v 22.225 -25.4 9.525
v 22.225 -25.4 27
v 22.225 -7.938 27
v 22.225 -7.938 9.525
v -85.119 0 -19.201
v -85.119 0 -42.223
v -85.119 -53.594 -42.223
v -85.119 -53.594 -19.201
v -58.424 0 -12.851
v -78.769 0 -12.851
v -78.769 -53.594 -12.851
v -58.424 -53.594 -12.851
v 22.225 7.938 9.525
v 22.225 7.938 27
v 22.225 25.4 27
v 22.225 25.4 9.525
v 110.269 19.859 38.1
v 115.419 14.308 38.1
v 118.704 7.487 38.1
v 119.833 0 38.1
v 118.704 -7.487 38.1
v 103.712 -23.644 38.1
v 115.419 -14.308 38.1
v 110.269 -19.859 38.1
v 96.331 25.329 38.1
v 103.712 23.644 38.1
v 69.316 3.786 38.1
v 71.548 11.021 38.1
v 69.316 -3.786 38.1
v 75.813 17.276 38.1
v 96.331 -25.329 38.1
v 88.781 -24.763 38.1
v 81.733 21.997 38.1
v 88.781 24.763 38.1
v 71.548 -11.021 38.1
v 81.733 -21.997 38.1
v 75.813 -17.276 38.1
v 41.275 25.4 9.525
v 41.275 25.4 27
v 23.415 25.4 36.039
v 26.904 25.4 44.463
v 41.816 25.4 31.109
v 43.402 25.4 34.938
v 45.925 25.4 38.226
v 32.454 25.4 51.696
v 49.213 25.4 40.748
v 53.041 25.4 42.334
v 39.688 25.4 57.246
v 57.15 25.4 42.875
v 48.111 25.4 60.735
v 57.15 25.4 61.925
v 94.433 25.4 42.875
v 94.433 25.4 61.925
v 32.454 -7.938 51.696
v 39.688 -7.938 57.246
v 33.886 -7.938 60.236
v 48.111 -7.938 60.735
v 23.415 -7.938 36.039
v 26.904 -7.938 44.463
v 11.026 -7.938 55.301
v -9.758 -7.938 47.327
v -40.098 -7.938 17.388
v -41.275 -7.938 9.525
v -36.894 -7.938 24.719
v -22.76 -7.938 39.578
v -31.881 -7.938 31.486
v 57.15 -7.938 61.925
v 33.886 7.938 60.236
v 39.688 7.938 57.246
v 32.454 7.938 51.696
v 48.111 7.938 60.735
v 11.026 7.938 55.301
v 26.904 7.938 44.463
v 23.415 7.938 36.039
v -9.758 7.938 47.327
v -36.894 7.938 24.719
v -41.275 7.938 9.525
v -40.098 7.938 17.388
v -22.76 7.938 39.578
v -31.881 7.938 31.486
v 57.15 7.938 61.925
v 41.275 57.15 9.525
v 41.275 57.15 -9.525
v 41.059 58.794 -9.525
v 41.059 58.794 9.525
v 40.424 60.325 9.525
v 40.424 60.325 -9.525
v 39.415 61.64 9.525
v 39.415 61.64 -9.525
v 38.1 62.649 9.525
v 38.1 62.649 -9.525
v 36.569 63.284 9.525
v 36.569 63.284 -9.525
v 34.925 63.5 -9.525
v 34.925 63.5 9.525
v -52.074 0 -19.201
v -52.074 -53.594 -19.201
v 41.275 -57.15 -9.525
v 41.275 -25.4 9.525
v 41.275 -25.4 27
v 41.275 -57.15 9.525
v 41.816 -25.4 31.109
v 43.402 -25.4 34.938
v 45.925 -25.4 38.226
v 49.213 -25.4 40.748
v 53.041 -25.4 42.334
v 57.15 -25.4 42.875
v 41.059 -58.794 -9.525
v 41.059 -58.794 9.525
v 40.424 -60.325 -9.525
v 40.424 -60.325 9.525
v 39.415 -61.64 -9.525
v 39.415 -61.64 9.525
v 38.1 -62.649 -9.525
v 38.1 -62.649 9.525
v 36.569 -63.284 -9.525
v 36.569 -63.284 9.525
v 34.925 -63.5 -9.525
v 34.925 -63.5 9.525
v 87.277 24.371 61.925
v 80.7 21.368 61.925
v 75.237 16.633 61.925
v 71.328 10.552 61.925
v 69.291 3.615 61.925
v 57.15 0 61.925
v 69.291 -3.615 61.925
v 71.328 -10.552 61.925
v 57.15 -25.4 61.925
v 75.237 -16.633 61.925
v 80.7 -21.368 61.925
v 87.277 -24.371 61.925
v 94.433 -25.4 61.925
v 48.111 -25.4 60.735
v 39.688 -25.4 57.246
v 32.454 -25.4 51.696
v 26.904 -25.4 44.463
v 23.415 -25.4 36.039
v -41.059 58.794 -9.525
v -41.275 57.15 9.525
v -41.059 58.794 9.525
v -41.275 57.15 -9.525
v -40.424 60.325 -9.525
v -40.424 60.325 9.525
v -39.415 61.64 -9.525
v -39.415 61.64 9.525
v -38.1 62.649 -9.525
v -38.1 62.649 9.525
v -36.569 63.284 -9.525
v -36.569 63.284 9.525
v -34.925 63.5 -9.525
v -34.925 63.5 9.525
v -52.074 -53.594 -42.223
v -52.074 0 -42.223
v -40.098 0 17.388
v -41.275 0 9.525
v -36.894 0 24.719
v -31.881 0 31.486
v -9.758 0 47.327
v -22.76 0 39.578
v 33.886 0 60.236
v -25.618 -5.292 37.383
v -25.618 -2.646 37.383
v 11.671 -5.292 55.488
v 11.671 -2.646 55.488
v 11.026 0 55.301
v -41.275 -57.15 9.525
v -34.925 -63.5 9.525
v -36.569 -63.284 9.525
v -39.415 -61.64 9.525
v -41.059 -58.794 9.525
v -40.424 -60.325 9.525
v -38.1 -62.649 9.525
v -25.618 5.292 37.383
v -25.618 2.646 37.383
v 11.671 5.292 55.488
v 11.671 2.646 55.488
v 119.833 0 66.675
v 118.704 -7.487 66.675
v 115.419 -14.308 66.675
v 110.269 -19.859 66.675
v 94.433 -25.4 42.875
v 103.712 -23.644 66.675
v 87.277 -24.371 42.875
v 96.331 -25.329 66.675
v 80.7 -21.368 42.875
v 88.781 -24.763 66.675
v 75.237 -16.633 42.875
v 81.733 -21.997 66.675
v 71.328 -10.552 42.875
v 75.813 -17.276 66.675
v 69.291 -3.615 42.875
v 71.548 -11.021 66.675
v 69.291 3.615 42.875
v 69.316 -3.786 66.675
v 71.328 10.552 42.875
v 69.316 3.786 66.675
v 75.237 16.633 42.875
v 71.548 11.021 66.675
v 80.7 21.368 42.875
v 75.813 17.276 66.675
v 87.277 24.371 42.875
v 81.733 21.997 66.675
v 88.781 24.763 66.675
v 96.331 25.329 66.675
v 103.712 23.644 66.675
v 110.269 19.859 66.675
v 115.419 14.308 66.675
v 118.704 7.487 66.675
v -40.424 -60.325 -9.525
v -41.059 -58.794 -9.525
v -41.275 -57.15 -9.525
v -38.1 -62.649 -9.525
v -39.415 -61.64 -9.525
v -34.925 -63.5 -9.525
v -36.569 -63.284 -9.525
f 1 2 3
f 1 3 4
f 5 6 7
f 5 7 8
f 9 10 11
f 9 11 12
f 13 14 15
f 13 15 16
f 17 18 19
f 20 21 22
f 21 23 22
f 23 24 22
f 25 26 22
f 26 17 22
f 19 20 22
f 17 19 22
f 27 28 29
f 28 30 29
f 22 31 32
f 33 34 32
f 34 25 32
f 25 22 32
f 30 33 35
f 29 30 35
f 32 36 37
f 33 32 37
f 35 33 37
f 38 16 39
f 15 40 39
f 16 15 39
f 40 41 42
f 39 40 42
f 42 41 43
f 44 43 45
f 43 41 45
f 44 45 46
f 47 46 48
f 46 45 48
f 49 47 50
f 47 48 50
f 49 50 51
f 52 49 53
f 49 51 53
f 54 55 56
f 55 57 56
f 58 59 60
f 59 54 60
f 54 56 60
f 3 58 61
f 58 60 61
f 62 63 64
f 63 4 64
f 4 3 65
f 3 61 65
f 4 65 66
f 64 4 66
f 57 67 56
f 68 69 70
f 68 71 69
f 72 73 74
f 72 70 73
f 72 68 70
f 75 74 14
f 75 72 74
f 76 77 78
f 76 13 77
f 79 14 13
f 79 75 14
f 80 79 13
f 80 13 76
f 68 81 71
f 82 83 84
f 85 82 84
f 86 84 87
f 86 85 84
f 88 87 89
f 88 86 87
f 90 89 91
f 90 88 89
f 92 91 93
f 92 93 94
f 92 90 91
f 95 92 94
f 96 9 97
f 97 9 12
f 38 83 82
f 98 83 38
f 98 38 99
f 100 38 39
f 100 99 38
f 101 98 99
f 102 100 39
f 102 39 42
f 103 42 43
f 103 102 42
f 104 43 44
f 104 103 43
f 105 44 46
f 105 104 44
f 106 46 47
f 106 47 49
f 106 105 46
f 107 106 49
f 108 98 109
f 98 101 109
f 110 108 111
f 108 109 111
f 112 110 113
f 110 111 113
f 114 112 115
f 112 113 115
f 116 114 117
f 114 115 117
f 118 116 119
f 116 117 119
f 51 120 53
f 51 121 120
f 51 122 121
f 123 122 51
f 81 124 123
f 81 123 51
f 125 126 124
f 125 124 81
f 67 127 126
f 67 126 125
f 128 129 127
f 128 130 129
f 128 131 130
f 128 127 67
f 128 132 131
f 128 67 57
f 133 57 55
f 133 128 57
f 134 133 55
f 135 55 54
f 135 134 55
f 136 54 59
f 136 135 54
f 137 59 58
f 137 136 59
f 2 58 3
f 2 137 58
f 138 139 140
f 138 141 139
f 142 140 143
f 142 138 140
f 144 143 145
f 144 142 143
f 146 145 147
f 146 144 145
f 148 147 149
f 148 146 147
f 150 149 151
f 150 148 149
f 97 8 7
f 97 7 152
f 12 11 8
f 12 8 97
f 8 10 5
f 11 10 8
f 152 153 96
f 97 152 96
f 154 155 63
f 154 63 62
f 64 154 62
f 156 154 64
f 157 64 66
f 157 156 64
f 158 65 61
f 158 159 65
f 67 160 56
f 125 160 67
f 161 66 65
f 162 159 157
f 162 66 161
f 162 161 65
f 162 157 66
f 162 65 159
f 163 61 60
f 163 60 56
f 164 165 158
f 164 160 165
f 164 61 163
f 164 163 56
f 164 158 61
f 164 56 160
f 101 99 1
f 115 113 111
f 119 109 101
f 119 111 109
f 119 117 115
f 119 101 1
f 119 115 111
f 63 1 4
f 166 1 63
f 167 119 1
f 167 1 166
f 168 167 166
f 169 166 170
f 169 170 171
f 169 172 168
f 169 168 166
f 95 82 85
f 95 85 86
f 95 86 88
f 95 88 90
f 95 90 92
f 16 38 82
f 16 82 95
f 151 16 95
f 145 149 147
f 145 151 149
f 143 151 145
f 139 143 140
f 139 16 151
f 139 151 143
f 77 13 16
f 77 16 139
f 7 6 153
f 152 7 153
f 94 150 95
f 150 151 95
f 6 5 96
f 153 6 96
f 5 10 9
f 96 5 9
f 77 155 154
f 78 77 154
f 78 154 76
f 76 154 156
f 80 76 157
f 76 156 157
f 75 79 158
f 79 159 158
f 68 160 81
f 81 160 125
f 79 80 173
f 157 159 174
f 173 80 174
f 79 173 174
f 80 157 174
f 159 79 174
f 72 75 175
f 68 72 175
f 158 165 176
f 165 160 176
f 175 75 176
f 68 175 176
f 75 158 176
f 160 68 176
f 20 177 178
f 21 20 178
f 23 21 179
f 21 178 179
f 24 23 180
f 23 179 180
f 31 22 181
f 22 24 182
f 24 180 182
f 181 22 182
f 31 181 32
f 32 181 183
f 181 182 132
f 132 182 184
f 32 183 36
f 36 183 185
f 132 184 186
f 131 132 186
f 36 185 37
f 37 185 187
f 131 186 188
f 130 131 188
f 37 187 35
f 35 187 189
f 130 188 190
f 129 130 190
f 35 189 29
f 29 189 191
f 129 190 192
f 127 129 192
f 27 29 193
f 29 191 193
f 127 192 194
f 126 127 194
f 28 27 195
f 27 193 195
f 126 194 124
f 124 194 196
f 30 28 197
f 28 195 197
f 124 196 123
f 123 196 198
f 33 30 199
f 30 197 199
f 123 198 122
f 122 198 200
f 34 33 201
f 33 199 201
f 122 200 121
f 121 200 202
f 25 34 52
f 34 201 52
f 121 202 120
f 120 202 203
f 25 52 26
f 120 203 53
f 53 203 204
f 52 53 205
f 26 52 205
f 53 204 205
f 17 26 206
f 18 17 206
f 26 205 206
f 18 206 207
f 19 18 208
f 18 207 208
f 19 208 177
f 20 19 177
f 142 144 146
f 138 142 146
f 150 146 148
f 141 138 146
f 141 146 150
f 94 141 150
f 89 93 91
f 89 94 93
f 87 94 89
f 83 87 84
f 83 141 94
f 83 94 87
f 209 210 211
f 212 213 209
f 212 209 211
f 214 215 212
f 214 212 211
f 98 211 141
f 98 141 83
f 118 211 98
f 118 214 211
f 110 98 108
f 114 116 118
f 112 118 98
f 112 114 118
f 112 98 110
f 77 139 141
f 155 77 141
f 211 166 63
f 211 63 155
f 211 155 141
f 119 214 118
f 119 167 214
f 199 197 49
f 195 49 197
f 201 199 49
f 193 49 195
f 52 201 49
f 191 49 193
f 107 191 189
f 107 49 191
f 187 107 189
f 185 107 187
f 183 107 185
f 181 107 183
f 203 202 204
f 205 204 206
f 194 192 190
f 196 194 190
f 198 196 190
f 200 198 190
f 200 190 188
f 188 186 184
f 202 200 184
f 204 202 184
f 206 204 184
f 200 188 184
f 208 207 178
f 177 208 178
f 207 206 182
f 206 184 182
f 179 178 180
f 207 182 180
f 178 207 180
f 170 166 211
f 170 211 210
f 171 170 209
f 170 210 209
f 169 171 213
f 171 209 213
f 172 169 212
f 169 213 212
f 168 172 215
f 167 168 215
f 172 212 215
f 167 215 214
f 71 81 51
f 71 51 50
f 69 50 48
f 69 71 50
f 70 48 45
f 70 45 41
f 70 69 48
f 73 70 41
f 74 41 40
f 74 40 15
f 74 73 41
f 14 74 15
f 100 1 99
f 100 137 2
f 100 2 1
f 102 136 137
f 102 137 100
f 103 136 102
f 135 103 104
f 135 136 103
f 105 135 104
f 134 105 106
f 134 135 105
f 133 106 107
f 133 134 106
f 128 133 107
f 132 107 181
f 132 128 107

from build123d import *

# Parameters (mm, degrees)
F1_DEPTH = 63.5
F0_W     = 25.4
F0_H     = 19.05
F2_DEPTH = 25.4
F3_DEPTH = 7.9375
F5_R     = 6.35
F6_W     = 33.044279
F6_H     = 29.372699
F7_DEPTH = 53.594
F8_SIZE  = 6.35


with BuildPart() as f1:
    # F0 (on Front) → F1 (new body, symmetric)
    with BuildSketch(Plane.XZ):
        Polygon((-41.275, -9.525), (41.275, -9.525), (41.275, 9.525), (22.225, 9.525), (-41.275, 9.525), align=None)
    extrude(amount=F1_DEPTH, both=True)

    # F0 (on Front) → F2 (join, symmetric)
    with BuildSketch(Plane.XZ):
        with BuildLine():
            Line((22.225, 9.525), (41.275, 9.525))
            Line((41.275, 9.525), (41.275, 27.0002))
            ThreePointArc((41.275, 27.0002), (45.92468, 38.22552), (57.15, 42.8752))
            Line((57.15, 42.8752), (69.03259, 42.8752))
            Line((69.03259, 42.8752), (69.03259, 61.9252))
            Line((69.03259, 61.9252), (57.15, 61.9252))
            ThreePointArc((57.15, 61.9252), (32.454296, 51.695904), (22.225, 27.0002))
            Line((22.225, 27.0002), (22.225, 9.525))
        make_face()
        with Locations((81.73259, 52.4002)):
            Rectangle(F0_W, F0_H)
    extrude(amount=F2_DEPTH, both=True)

    # F0 (on Front) → F3 (join, symmetric)
    with BuildSketch(Plane.XZ):
        with BuildLine():
            add(Edge.make_bspline(
                [(-41.275, 9.525), (-40.913433, 41.622374), (12.055526, 61.959676), (57.15, 61.9252)],
                knots=[0, 0, 0, 0, 111.504536, 111.504536, 111.504536, 111.504536], degree=3))
            Line((-41.275, 9.525), (22.225, 9.525))
            Line((22.225, 9.525), (22.225, 27.0002))
            ThreePointArc((22.225, 27.0002), (32.454296, 51.695904), (57.15, 61.9252))
        make_face()
    extrude(amount=F3_DEPTH, both=True)

    # F0 (on Front) → F4 (revolve)
    with BuildSketch(Plane.XZ):
        Polygon((94.43259, 66.675), (94.43259, 61.9252), (94.43259, 42.8752), (94.43259, 38.1), (119.83259, 38.1), (119.83259, 66.675), align=None)
    revolve(axis=Axis((94.43259, 0, 52.4002), (0, 0, -1)))

    # F5
    f5_edges = [f1.edges().sort_by_distance(p)[0] for p in [
        (-41.275, -63.5, 0),
        (41.275, -63.5, 0),
        (41.275, 63.5, 0),
        (-41.275, 63.5, 0),
    ]]
    fillet(f5_edges, radius=F5_R)


with BuildPart() as f7:
    # F6 (on Front) → F7 (new body)
    with BuildSketch(Plane.XZ):
        with Locations((-68.596534, -27.536902)):
            Rectangle(F6_W, F6_H)
    extrude(amount=F7_DEPTH)

    # F8
    f8_edges = [f7.edges().sort_by_distance(p)[0] for p in [
        (-85.118674, -26.797, -12.850553),
        (-52.074395, -26.797, -12.850553),
    ]]
    chamfer(f8_edges, length=F8_SIZE)


solid = Compound([f1.part, f7.part])
